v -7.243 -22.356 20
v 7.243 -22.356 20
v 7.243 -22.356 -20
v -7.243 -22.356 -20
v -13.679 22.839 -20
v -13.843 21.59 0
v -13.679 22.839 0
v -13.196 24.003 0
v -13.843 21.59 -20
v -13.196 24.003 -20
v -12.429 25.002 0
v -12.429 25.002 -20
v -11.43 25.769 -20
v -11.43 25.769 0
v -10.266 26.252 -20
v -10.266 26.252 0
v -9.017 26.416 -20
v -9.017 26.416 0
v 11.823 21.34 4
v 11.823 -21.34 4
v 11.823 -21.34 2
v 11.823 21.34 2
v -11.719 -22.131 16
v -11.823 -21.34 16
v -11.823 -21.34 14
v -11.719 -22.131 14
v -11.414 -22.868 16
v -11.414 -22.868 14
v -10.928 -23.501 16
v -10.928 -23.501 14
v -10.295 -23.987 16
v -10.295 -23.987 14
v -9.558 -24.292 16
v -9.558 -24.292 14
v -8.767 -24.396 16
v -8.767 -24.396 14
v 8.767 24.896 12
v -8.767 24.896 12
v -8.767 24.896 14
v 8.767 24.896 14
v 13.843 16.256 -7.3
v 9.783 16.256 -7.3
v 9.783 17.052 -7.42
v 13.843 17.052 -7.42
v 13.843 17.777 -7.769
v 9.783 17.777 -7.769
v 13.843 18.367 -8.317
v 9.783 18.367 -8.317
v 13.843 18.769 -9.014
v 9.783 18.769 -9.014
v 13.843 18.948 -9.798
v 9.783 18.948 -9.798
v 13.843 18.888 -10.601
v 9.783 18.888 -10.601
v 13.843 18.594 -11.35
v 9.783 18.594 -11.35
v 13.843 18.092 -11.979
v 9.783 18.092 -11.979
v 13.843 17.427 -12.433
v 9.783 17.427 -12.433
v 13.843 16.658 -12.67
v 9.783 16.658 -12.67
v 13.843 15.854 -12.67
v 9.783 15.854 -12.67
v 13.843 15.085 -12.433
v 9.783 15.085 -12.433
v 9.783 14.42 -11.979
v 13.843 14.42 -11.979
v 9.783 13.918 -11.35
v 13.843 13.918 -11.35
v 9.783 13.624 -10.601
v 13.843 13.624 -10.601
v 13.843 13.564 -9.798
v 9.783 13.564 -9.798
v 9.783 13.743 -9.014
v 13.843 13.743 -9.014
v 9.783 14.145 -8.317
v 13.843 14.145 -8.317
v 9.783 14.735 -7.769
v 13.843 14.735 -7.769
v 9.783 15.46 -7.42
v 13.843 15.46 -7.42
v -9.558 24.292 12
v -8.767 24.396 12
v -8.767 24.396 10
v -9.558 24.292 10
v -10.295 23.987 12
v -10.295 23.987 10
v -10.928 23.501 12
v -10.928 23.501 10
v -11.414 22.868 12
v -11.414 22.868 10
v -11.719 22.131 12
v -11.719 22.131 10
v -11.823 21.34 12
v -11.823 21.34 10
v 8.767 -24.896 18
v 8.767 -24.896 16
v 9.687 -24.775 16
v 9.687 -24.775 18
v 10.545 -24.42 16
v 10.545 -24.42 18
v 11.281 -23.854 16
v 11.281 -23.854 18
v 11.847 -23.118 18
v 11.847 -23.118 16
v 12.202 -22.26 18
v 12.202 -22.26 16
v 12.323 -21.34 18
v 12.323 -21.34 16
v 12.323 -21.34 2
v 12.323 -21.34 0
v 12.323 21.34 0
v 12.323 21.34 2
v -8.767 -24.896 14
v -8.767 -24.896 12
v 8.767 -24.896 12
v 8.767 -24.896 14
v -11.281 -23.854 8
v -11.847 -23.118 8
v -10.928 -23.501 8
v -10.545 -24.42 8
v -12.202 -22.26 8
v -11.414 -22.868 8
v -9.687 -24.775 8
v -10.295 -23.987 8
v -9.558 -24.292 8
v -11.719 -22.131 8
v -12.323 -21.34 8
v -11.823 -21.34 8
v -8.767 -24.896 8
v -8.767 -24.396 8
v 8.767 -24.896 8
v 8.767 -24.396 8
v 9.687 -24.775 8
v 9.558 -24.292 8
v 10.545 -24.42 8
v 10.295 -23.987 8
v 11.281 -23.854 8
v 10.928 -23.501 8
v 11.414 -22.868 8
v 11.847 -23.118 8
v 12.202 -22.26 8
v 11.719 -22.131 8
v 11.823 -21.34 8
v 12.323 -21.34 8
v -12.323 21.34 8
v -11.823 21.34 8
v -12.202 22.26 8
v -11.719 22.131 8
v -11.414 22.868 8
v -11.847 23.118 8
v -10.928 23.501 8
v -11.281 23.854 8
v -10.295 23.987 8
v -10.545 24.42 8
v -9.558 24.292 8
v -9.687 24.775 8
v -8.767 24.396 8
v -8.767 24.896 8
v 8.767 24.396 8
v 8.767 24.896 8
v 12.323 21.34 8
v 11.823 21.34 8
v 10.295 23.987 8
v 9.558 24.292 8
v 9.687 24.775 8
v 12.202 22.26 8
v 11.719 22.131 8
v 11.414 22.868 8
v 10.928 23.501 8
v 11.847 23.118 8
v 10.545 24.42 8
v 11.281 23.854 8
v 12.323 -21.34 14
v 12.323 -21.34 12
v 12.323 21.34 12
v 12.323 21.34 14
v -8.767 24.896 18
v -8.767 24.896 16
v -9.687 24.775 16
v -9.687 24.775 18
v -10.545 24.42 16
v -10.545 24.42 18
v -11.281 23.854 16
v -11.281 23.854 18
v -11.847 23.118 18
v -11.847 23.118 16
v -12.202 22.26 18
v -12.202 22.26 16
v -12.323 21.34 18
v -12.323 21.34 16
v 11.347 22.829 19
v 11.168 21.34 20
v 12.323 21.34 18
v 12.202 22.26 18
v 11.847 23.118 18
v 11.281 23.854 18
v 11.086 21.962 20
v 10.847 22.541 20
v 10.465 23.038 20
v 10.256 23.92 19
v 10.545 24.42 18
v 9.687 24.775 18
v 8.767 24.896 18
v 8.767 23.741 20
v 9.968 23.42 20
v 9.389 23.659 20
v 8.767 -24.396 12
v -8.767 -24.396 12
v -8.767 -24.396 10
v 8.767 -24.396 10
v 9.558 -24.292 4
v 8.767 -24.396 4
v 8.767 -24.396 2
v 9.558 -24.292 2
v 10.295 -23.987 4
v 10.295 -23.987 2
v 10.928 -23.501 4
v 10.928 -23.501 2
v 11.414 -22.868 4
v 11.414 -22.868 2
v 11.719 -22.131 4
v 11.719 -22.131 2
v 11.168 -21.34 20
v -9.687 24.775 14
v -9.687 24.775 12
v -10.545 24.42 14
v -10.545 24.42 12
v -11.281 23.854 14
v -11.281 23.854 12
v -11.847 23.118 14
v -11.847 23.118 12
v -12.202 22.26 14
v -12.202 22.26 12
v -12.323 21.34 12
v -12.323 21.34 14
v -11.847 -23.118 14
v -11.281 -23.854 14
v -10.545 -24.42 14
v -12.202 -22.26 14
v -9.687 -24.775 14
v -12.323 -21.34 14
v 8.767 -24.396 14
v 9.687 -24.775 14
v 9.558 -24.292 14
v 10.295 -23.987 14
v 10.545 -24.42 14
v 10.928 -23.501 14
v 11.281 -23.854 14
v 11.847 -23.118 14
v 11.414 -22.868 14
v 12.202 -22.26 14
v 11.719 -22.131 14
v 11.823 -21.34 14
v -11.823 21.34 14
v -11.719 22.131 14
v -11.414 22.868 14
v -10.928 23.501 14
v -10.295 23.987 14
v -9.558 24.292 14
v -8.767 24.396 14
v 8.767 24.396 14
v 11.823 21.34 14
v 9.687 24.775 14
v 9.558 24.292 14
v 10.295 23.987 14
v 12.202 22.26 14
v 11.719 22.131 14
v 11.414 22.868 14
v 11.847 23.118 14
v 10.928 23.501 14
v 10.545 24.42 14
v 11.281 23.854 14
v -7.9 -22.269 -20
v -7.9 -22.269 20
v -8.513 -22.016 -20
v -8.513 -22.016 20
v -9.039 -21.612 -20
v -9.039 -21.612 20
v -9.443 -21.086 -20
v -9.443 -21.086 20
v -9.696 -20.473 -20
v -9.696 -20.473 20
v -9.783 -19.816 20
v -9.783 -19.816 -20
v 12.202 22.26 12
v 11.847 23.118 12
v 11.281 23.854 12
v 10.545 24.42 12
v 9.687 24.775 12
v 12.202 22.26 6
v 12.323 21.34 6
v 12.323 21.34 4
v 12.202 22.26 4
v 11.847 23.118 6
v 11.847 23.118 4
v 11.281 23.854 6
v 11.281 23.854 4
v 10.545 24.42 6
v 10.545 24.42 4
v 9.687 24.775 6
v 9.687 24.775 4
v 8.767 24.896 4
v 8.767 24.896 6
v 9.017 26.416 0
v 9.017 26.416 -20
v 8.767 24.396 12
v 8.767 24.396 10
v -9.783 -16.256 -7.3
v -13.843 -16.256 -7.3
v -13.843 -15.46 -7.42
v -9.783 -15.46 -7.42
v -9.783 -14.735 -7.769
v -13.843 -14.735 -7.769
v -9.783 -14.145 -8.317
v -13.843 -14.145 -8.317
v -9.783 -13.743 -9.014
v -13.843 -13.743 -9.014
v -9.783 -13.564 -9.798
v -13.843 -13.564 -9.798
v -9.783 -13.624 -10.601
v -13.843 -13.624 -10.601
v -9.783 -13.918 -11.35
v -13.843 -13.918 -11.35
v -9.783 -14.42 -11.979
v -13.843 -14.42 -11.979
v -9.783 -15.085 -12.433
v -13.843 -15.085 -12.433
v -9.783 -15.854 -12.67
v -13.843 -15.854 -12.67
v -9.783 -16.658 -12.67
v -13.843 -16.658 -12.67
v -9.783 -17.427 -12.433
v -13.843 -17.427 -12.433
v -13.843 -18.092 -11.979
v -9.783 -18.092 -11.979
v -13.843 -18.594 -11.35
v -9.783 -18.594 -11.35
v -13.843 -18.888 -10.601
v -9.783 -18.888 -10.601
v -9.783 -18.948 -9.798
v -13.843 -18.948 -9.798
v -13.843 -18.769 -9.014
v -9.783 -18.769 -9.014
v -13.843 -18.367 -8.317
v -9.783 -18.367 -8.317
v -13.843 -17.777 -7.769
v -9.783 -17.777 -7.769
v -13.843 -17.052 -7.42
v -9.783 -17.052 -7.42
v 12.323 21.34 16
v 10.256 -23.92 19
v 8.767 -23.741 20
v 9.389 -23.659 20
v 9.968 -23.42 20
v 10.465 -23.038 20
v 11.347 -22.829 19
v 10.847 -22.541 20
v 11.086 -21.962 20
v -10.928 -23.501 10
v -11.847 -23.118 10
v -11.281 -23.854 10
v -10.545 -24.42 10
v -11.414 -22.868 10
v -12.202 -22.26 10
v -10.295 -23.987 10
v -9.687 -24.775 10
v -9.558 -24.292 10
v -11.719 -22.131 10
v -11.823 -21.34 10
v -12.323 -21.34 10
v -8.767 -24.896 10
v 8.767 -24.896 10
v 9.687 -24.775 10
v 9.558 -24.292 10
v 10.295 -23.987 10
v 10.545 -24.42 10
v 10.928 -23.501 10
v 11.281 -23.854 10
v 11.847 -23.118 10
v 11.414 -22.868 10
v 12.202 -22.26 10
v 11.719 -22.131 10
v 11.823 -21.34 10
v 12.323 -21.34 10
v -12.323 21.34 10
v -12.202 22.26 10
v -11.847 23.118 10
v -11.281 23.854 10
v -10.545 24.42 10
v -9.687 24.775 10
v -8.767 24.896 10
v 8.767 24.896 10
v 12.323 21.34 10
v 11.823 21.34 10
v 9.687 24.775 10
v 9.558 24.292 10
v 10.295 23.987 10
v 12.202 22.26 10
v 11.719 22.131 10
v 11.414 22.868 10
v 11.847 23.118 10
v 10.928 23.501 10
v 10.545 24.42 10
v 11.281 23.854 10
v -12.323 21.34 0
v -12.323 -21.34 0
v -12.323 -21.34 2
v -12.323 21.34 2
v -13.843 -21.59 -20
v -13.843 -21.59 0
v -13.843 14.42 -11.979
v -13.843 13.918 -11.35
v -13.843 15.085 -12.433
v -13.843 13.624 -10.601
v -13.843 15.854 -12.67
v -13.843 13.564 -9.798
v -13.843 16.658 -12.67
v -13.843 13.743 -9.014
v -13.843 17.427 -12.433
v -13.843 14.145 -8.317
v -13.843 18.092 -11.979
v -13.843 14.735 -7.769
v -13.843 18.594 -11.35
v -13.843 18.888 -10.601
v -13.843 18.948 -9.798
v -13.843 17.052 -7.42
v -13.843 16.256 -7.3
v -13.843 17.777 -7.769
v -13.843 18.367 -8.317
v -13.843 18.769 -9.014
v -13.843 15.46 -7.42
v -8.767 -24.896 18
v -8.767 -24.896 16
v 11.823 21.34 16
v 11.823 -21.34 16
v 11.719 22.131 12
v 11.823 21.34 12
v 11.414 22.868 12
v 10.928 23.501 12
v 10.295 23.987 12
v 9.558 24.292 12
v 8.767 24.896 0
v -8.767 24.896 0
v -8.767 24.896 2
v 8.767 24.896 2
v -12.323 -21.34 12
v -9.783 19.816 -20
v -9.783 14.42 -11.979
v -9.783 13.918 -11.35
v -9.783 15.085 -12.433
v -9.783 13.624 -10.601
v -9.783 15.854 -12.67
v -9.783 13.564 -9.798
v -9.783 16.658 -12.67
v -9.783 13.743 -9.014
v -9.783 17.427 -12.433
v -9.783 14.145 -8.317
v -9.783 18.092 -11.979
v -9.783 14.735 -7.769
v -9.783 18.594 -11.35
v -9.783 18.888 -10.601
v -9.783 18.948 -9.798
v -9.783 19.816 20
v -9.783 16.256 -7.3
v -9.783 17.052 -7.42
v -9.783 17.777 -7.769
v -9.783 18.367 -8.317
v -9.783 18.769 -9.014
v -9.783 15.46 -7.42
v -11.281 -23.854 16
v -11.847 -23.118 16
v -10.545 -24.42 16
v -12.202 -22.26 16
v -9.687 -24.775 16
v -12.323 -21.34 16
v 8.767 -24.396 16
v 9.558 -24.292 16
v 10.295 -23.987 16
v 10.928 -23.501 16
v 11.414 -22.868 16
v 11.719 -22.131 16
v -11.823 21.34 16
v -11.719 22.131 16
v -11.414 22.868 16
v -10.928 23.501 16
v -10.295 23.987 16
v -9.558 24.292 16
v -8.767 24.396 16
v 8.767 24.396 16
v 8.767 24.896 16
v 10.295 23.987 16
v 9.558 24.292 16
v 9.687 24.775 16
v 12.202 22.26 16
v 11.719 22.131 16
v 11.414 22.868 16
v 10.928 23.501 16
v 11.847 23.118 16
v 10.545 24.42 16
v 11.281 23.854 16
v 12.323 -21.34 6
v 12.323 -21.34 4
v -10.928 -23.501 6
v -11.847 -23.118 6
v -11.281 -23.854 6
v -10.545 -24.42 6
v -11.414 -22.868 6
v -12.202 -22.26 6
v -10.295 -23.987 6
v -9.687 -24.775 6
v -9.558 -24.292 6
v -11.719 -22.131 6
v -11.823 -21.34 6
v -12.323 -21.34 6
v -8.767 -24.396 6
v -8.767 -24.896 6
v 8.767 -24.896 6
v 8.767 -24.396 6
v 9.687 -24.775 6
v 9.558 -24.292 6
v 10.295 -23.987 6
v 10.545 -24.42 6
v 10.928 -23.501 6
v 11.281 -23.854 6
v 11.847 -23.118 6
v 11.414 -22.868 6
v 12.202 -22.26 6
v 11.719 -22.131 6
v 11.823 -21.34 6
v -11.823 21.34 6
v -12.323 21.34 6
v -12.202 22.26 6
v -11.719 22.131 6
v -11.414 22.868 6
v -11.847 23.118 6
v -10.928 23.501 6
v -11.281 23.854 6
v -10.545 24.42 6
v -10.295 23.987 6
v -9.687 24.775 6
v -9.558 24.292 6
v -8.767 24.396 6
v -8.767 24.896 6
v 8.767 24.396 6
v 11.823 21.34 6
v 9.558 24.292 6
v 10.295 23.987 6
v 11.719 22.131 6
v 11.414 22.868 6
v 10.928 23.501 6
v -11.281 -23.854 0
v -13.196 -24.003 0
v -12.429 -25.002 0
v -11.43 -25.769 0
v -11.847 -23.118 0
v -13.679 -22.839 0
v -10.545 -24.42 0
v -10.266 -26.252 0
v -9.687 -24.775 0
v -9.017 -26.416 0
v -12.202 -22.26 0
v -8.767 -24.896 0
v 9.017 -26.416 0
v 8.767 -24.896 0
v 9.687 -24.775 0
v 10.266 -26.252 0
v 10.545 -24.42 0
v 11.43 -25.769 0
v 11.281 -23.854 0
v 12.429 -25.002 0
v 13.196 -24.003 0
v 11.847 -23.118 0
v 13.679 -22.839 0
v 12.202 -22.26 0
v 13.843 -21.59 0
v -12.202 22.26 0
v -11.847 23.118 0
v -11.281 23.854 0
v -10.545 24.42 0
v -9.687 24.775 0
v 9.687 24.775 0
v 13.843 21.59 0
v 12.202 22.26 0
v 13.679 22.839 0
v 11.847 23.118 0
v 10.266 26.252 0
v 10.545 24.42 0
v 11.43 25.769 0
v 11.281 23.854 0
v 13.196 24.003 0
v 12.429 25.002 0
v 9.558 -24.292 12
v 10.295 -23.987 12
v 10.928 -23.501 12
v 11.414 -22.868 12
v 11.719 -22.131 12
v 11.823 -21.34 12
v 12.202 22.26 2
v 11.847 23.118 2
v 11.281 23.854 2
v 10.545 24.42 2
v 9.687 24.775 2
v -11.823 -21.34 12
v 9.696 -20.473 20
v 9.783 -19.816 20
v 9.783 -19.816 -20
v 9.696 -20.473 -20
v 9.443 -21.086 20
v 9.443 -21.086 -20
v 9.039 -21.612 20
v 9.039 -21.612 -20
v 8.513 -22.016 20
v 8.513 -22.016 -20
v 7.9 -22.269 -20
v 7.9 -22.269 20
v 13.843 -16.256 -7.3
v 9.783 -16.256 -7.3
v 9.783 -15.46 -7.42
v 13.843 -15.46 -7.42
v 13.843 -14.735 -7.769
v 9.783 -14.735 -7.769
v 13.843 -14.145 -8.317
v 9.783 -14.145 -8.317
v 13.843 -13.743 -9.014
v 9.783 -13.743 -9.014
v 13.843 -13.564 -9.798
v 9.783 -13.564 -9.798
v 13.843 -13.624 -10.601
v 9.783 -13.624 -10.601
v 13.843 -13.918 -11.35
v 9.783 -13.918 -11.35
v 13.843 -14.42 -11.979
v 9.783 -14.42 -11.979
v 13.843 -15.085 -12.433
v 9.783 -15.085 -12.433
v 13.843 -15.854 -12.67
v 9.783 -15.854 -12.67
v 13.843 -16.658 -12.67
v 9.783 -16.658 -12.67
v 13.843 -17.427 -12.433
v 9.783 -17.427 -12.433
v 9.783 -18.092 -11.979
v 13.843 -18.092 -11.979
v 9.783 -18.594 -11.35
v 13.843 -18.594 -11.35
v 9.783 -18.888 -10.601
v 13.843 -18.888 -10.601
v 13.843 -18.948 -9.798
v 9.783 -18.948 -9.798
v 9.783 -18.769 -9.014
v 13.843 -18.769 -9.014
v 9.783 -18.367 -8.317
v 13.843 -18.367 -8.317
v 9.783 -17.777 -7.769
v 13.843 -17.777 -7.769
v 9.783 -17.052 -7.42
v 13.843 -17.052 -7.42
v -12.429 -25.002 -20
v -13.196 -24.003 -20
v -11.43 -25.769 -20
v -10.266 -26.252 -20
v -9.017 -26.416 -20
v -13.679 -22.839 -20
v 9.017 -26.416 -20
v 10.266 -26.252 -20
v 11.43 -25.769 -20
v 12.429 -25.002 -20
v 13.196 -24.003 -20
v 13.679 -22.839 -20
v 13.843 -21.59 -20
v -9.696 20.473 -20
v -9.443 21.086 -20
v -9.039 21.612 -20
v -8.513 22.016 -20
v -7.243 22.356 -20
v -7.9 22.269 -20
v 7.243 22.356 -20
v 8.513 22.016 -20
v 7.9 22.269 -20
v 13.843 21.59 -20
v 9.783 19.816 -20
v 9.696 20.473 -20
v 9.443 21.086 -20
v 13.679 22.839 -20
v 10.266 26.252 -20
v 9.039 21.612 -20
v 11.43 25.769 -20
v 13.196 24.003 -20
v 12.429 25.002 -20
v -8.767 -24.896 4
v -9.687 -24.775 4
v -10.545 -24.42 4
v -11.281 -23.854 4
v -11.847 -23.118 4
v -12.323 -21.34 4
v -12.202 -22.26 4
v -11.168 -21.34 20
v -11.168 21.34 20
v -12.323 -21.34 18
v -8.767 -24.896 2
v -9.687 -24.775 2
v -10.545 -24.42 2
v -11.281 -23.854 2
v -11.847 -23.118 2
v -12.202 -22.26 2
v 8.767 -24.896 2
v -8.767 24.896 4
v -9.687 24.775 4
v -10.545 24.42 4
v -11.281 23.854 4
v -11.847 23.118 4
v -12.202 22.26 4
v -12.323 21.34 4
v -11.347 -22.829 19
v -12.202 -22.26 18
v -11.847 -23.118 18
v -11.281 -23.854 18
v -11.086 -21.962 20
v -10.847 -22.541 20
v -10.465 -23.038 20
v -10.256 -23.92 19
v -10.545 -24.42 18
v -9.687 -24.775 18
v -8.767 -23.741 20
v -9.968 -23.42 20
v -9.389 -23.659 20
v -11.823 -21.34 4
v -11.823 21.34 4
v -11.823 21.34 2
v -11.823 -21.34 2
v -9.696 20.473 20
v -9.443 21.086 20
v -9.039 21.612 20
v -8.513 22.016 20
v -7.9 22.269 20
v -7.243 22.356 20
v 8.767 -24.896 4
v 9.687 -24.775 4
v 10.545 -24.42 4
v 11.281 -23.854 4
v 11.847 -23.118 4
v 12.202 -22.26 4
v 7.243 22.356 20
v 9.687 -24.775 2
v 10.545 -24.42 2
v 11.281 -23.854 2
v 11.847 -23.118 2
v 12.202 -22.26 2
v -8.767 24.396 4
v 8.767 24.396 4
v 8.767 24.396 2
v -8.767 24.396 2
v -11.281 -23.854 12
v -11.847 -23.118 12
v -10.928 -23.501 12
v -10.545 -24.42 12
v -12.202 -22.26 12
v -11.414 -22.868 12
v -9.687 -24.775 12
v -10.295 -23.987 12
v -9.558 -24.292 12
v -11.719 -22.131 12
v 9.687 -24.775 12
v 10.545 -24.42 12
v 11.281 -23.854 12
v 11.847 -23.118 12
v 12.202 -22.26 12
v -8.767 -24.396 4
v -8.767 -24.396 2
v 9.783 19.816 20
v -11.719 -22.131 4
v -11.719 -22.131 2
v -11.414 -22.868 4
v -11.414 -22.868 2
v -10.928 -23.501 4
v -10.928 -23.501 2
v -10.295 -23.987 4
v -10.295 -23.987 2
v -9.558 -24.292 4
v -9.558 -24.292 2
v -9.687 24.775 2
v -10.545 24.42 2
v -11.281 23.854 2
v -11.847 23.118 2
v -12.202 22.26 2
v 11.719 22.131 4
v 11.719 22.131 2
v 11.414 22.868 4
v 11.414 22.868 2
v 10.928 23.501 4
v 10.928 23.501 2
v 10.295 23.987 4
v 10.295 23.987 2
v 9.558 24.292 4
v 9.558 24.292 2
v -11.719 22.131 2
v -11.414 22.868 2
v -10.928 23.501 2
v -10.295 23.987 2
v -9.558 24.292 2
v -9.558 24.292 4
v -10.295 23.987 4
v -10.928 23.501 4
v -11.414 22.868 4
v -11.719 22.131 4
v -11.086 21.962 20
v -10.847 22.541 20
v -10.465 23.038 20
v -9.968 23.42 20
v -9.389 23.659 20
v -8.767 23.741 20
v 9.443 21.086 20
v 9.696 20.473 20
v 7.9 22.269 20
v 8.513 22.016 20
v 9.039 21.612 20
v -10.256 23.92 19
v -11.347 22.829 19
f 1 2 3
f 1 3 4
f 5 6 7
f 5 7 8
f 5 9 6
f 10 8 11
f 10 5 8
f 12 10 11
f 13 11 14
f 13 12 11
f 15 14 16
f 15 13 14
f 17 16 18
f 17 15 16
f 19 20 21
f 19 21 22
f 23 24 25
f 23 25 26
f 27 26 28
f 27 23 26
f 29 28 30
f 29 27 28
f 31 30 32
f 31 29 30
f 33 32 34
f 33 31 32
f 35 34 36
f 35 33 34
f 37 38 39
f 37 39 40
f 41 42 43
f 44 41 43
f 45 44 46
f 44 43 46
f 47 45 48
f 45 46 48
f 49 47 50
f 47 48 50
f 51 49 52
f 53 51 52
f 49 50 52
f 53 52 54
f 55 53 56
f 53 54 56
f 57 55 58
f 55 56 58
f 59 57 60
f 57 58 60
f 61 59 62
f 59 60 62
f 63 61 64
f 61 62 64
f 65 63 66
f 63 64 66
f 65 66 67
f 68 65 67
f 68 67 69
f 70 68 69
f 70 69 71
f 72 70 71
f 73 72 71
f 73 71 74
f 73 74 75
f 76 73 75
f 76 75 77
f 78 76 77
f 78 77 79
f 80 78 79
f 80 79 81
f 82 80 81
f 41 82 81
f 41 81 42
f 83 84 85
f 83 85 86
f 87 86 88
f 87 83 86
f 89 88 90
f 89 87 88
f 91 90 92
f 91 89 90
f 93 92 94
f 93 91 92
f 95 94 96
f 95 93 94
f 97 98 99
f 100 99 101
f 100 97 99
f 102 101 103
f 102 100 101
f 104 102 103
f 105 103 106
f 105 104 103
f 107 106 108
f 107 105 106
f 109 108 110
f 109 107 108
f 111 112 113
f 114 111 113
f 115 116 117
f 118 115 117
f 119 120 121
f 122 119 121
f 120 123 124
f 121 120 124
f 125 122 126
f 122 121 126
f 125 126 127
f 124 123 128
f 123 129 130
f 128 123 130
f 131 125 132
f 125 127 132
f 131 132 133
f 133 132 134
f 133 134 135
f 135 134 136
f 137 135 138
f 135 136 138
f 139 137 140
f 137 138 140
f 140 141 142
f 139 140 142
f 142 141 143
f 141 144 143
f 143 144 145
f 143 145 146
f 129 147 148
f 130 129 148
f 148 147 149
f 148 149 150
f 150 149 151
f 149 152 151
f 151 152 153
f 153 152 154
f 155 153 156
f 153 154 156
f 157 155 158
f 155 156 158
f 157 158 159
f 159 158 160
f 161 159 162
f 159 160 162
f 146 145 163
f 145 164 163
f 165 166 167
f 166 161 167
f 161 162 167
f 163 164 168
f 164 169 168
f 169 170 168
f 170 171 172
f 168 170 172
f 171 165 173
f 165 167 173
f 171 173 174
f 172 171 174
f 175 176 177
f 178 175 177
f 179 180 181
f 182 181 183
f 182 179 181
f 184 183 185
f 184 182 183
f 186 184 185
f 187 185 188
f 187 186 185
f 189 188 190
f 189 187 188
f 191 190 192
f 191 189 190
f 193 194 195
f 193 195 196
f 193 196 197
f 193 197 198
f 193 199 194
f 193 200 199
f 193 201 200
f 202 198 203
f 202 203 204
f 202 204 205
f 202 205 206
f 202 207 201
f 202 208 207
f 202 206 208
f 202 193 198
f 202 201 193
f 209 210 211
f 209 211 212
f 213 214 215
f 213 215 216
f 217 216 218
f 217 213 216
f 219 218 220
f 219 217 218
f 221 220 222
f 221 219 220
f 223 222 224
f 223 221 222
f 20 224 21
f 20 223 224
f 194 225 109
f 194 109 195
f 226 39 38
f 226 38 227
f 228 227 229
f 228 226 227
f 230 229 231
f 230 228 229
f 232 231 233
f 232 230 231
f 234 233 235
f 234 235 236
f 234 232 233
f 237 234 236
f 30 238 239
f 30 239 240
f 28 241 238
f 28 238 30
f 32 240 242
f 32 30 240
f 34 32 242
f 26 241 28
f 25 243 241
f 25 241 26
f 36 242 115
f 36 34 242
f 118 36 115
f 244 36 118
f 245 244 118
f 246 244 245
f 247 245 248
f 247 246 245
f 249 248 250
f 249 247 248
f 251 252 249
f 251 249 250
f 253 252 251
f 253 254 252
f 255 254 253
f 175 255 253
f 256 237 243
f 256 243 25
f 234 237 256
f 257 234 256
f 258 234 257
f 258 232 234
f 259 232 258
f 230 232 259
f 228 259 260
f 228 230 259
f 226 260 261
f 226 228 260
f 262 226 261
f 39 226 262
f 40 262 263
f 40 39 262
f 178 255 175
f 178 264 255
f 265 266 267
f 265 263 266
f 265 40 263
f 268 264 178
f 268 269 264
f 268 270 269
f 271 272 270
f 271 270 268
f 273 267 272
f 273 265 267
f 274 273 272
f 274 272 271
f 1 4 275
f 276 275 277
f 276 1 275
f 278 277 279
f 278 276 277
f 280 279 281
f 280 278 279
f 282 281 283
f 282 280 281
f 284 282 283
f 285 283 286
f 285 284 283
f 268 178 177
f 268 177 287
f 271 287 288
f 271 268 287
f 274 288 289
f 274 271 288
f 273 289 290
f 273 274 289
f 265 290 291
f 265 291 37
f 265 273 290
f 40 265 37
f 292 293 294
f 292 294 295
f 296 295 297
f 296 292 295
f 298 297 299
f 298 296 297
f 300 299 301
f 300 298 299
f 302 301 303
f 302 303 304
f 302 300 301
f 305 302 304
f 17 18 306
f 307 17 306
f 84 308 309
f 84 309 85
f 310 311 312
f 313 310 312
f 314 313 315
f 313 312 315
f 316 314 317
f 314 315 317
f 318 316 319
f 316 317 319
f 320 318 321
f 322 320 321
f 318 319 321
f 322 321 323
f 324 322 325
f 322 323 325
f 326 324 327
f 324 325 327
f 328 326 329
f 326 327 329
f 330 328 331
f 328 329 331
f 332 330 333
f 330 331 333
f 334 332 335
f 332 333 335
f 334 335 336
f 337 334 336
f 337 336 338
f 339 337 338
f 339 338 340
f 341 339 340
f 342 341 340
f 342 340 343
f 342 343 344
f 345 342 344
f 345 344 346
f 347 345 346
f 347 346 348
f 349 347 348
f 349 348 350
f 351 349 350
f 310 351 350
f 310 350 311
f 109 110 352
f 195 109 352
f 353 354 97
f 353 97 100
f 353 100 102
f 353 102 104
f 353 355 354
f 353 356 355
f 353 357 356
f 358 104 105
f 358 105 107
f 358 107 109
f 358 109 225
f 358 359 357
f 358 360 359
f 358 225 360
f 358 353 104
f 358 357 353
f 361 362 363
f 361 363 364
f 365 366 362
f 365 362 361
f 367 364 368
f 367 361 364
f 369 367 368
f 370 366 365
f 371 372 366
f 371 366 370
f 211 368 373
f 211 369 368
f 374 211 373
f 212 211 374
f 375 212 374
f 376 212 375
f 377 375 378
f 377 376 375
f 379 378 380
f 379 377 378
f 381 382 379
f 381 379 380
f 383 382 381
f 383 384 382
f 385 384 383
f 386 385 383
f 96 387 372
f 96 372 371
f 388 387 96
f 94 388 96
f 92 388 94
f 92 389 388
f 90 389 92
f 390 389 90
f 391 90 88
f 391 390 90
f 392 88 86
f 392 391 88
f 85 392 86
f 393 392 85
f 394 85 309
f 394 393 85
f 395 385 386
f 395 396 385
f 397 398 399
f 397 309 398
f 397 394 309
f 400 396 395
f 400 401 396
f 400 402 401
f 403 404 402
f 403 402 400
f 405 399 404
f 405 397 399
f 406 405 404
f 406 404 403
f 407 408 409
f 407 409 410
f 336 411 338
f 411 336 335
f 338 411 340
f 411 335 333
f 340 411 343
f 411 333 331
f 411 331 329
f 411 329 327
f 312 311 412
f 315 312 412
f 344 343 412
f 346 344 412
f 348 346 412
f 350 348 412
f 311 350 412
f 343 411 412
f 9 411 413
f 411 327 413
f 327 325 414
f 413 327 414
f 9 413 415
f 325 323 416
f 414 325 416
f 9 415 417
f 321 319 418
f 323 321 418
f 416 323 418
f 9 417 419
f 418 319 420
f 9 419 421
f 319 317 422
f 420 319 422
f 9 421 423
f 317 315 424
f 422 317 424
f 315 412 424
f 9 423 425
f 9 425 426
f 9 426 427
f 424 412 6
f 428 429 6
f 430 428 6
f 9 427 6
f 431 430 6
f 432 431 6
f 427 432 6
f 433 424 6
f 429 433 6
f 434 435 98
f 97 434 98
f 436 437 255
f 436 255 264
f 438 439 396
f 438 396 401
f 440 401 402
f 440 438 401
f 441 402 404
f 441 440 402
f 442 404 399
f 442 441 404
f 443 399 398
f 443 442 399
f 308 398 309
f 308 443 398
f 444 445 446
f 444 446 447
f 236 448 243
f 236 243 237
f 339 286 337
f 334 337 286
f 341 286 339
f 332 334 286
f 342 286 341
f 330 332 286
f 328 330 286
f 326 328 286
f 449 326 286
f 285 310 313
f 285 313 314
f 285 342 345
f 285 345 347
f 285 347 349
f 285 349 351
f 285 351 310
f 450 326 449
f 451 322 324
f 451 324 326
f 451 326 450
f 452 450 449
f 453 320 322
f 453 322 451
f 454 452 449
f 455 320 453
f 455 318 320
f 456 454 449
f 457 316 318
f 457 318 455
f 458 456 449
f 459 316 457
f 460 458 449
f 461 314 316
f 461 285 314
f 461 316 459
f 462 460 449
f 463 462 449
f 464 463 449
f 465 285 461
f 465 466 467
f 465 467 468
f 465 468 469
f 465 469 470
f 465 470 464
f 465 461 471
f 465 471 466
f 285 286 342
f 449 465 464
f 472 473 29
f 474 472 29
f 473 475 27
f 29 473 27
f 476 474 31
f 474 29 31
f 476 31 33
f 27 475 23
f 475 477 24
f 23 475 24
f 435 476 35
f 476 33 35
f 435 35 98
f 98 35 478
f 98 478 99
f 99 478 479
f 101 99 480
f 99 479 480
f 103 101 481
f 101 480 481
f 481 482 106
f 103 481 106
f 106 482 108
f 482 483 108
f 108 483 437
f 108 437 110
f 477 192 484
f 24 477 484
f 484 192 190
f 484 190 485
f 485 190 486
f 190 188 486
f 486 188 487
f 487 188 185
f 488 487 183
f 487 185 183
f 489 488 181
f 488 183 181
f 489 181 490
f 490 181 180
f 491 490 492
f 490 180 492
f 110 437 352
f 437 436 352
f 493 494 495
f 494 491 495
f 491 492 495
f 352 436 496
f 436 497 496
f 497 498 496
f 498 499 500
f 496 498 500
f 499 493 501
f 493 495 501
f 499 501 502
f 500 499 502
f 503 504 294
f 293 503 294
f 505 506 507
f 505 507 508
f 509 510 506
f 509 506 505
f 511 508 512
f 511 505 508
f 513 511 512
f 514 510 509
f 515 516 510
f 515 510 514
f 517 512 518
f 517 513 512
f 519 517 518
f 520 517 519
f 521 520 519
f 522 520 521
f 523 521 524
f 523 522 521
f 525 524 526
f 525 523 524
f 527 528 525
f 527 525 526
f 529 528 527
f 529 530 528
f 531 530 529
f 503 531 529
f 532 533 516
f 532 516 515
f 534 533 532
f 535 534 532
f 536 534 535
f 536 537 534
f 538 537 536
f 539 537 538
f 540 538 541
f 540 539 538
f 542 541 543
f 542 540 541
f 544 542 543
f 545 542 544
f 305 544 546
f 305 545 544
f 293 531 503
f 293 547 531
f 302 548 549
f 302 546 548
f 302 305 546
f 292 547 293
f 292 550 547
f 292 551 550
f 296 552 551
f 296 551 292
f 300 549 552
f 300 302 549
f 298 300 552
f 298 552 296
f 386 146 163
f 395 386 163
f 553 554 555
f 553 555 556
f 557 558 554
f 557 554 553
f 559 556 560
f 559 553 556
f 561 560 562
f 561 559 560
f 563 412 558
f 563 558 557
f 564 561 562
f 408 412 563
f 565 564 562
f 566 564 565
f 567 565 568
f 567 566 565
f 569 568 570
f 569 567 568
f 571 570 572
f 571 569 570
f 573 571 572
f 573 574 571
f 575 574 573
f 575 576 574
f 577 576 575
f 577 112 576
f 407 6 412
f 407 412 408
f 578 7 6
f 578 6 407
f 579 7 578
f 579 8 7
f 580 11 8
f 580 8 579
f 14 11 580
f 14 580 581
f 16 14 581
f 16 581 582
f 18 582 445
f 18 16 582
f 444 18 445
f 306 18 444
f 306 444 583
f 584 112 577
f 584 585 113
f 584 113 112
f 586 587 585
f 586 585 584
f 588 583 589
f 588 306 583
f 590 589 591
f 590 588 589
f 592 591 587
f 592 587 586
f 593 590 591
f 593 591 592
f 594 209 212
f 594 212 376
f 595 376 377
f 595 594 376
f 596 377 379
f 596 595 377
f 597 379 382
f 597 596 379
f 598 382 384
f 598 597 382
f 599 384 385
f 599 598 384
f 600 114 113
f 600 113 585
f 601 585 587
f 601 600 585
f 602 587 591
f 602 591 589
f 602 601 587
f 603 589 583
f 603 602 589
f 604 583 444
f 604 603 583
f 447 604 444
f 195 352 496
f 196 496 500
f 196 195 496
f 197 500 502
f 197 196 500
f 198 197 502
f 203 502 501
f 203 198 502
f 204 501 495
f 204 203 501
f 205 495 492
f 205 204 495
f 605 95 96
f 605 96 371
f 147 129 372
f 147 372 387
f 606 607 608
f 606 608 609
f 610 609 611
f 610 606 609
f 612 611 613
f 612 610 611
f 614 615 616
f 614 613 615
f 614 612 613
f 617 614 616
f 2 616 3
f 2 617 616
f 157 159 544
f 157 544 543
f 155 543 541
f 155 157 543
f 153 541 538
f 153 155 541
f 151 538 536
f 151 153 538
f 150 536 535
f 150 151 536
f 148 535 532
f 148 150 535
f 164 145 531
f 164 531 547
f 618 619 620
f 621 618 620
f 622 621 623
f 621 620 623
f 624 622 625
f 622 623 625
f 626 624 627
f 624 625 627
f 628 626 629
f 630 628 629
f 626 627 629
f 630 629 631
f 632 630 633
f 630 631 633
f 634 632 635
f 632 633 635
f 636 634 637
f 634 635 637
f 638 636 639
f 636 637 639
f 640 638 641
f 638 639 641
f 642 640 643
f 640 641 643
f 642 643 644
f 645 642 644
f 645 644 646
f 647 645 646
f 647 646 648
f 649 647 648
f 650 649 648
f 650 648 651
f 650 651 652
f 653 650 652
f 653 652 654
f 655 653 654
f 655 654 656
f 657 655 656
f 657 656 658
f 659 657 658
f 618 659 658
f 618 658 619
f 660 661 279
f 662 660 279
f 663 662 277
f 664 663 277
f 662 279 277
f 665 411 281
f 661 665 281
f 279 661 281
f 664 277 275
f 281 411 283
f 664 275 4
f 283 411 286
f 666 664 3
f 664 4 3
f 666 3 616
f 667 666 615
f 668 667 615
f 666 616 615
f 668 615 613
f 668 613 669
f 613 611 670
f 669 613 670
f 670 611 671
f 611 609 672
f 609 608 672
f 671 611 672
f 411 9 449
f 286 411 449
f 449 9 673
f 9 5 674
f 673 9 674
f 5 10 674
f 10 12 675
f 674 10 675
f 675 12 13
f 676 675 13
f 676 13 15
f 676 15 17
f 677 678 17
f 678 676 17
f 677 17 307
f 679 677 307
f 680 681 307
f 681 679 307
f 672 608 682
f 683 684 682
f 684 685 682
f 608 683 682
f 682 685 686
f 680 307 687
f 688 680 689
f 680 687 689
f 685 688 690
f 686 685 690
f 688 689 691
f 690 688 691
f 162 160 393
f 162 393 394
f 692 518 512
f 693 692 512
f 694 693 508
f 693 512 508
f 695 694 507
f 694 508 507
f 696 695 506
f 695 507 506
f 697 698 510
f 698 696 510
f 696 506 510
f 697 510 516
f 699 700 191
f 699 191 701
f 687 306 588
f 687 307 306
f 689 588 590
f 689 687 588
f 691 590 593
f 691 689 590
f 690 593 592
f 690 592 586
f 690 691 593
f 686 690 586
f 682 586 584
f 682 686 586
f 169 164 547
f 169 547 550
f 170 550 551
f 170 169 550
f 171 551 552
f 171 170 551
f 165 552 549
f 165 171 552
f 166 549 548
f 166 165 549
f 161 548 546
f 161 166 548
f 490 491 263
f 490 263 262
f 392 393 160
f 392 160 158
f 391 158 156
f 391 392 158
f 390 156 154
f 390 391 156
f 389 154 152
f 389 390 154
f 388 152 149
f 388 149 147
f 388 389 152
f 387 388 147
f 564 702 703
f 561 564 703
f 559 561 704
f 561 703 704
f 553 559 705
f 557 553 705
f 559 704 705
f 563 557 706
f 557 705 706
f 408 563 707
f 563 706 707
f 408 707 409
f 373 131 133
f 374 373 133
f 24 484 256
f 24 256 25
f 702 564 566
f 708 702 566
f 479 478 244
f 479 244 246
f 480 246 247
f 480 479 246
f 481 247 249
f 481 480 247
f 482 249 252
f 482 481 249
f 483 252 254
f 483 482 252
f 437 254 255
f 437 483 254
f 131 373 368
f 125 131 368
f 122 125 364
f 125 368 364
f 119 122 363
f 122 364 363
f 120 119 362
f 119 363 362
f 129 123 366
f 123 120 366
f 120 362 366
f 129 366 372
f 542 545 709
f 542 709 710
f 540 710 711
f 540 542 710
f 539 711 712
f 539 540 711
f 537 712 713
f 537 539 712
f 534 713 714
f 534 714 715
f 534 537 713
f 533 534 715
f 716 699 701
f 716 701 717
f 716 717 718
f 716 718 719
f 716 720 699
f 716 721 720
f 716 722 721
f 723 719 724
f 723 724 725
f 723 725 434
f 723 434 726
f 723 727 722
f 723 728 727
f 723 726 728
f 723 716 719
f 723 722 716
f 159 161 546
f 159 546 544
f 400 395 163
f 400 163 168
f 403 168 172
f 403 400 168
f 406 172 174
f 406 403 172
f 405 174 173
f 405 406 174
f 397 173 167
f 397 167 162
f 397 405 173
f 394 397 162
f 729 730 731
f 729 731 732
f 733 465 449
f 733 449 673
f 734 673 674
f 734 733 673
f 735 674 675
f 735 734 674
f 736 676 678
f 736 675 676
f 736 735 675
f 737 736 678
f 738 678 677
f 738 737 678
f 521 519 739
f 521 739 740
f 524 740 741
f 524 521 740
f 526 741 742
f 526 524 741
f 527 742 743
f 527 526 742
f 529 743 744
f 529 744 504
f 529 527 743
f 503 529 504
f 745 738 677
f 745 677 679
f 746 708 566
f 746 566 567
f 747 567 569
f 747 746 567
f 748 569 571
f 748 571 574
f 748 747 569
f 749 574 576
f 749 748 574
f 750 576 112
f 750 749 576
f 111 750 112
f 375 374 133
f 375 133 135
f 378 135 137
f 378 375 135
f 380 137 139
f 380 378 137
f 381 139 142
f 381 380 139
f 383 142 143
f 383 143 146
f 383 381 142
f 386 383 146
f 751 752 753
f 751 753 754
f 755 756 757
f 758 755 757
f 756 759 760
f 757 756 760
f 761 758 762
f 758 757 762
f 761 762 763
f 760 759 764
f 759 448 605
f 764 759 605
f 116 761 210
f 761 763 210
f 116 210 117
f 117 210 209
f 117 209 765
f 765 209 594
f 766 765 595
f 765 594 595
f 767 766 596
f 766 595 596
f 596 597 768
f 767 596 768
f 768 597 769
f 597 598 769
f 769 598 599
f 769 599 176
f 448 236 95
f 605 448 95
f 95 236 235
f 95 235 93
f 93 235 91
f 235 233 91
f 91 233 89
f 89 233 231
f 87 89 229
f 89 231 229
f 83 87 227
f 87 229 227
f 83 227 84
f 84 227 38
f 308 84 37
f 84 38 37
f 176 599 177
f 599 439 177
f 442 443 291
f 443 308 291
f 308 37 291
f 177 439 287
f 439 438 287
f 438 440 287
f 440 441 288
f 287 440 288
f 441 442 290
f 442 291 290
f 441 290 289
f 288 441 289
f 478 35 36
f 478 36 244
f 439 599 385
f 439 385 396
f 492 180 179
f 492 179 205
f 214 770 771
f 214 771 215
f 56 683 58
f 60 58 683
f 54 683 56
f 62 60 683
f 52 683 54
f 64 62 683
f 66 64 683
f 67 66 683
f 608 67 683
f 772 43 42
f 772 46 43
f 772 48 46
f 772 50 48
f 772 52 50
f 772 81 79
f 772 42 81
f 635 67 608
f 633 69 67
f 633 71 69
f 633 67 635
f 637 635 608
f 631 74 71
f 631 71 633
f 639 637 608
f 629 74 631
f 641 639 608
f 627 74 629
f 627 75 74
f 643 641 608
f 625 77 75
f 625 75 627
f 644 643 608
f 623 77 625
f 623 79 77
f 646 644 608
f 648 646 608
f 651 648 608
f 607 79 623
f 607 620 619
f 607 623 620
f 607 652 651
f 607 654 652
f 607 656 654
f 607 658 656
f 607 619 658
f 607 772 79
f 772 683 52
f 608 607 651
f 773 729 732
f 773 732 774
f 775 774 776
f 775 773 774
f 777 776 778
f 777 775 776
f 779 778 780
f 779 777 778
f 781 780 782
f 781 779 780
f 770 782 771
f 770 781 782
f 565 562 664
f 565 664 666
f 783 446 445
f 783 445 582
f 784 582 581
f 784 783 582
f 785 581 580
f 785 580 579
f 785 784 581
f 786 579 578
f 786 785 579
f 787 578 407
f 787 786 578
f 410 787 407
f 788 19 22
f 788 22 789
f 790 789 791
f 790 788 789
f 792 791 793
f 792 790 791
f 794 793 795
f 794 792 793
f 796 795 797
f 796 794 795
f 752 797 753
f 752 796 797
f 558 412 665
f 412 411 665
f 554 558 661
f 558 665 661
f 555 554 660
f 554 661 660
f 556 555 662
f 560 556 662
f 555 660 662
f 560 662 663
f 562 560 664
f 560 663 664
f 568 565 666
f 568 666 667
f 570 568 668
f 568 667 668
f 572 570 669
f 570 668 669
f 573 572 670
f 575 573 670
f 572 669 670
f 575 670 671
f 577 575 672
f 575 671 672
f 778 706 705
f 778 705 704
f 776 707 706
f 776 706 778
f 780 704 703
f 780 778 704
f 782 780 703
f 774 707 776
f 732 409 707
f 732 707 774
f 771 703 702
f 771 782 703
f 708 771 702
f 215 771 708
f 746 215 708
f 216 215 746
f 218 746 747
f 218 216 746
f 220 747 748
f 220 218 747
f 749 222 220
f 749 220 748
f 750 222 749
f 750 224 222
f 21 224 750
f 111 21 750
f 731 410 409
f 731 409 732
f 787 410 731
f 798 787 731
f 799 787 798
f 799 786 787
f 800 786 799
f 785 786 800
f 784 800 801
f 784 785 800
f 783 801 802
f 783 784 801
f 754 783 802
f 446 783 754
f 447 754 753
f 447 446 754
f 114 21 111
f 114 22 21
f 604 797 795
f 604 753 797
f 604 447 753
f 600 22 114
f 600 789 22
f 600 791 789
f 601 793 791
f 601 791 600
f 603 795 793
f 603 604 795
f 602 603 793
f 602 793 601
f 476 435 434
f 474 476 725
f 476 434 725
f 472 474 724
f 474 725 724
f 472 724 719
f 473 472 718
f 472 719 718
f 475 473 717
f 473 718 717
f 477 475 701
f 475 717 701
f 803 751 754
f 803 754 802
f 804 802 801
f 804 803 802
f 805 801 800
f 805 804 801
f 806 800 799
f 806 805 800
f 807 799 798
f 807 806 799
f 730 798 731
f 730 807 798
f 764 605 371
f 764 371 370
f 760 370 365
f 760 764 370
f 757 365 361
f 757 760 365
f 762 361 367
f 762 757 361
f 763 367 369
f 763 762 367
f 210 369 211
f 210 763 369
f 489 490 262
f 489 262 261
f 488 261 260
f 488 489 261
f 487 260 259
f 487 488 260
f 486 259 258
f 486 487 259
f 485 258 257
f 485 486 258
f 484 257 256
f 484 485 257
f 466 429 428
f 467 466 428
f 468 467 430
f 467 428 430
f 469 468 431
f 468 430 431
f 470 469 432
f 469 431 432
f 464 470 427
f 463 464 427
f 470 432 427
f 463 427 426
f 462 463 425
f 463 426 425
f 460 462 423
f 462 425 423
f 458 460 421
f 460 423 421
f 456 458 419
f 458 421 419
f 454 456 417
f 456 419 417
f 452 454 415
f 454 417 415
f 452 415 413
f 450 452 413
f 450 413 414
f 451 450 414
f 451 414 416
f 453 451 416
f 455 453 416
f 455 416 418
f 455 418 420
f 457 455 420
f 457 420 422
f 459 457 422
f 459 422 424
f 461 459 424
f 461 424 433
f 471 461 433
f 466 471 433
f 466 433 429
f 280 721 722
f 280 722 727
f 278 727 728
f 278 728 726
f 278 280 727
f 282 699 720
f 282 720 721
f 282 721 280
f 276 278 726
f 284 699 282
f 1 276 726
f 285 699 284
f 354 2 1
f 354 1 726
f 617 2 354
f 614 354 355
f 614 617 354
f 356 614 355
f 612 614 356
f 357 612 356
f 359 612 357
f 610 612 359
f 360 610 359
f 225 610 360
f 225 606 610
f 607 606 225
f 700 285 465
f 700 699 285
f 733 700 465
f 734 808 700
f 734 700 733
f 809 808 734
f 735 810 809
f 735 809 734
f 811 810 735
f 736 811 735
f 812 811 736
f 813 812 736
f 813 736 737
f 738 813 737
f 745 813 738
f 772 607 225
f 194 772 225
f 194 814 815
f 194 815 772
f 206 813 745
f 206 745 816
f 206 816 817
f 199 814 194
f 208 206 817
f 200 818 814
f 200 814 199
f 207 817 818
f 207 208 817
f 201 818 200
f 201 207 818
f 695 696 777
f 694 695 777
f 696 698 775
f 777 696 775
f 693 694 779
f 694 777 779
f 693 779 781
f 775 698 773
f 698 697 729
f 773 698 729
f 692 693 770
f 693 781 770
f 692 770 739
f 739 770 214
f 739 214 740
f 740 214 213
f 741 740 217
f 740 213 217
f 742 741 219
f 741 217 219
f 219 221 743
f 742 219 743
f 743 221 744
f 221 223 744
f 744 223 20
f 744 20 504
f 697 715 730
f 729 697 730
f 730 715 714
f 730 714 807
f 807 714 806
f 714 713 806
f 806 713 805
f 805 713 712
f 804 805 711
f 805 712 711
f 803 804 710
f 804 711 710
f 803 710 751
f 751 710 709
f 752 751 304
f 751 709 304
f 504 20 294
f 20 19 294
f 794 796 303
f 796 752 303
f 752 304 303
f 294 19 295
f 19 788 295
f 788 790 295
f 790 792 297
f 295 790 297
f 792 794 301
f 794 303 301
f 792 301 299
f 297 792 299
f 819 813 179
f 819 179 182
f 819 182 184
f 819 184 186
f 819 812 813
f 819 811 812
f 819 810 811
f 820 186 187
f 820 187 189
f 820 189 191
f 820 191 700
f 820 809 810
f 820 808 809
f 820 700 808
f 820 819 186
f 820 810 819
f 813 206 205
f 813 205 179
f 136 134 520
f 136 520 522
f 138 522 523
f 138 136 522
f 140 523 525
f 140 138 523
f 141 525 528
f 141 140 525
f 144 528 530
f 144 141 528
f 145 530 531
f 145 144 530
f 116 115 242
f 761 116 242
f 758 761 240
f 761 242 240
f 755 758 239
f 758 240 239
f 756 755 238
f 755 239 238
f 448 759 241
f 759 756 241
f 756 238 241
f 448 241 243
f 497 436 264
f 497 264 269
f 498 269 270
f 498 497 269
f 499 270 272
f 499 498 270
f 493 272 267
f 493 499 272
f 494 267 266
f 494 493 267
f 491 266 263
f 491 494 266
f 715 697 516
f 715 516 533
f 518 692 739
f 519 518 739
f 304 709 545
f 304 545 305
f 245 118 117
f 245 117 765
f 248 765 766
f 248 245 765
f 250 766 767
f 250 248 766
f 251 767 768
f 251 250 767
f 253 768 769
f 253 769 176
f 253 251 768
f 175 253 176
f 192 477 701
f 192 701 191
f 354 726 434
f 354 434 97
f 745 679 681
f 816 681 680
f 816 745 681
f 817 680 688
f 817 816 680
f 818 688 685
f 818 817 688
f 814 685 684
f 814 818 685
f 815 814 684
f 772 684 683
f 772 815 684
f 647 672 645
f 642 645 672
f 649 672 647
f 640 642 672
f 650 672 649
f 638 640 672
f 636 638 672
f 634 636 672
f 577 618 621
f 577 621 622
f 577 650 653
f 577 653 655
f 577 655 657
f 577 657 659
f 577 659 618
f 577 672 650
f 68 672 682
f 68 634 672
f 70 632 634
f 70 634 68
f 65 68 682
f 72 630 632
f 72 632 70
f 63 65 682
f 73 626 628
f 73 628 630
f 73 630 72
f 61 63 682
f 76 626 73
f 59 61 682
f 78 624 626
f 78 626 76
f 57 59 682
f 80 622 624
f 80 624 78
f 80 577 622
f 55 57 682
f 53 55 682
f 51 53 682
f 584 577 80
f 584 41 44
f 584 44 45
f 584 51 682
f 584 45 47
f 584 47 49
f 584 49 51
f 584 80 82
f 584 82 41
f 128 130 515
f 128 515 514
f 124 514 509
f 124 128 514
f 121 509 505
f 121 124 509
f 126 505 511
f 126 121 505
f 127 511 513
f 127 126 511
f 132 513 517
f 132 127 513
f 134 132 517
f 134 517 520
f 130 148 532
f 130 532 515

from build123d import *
from OCP.BRepFilletAPI import BRepFilletAPI_MakeChamfer

# Parameters (mm, degrees)
SKETCH1_W             = 24.646
SKETCH1_H             = 49.792
BOSS_EXTRUDE1_DEPTH   = 20
SKETCH2_W             = 27.686
SKETCH2_H             = 52.832
BOSS_EXTRUDE2_DEPTH   = 20
FILLET1_R             = 3.556
FILLET2_R             = 4.826
F_5_0MM_DOWEL_HOLE2_D = 5.4
CUT_EXTRUDE1_DEPTH    = 50.894225167
CUT_EXTRUDE2_START    = -4
CUT_EXTRUDE2_DEPTH    = 2
LPATTERN1_COUNT       = 4
LPATTERN1_PITCH       = 4
CHAMFER1_SIZE         = 2
CHAMFER1_SIZE2        = 1.154700538


with BuildPart() as part:
    # Sketch1 → Boss-Extrude1 (new body)
    with BuildSketch(Plane.XY):
        Rectangle(SKETCH1_W, SKETCH1_H)
    extrude(amount=BOSS_EXTRUDE1_DEPTH)

    # Sketch2 → Boss-Extrude2 (add)
    with BuildSketch(Plane.XY):
        Rectangle(SKETCH2_W, SKETCH2_H)
    extrude(amount=-BOSS_EXTRUDE2_DEPTH)

    # Fillet1
    fillet1_edges = [part.edges().sort_by_distance(p)[0] for p in [
        (-12.323, 24.896, 10),
        (12.323, 24.896, 10),
        (12.323, -24.896, 10),
        (-12.323, -24.896, 10),
    ]]
    fillet(fillet1_edges, radius=FILLET1_R)

    # Fillet2
    fillet2_edges = [part.edges().sort_by_distance(p)[0] for p in [
        (-13.843, -26.416, -10),
        (-13.843, 26.416, -10),
        (13.843, 26.416, -10),
        (13.843, -26.416, -10),
    ]]
    fillet(fillet2_edges, radius=FILLET2_R)

    # Ø5.0mm Dowel Hole2 (through all)
    with Locations(Plane(origin=(13.843, 0, 0), x_dir=(0, 0, -1), z_dir=(1, 0, 0))):
        with Locations((10, 16.256), (10, -16.256)):
            Hole(F_5_0MM_DOWEL_HOLE2_D / 2)

    # Sketch9 → Cut-Extrude1 (cut, through all)
    with BuildSketch(Plane.XY.offset(20)):
        with BuildLine():
            Line((7.243, -22.356), (-7.243, -22.356))
            ThreePointArc((-7.243, -22.356), (-9.039051224, -21.612051224), (-9.783, -19.816))
            Line((-9.783, -19.816), (-9.783, 19.816))
            ThreePointArc((-9.783, 19.816), (-9.039051224, 21.612051224), (-7.243, 22.356))
            Line((-7.243, 22.356), (7.243, 22.356))
            ThreePointArc((7.243, 22.356), (9.039051224, 21.612051224), (9.783, 19.816))
            Line((9.783, 19.816), (9.783, -19.816))
            ThreePointArc((9.783, -19.816), (9.039051224, -21.612051224), (7.243, -22.356))
        make_face()
    extrude(amount=-CUT_EXTRUDE1_DEPTH, mode=Mode.SUBTRACT)

    # Sketch10 → Cut-Extrude2 (cut)
    with BuildSketch(Plane.XY.offset(20).offset(CUT_EXTRUDE2_START)):
        with BuildLine():
            Line((-12.323, 21.34), (-12.323, -21.34))
            ThreePointArc((-12.323, -21.34), (-11.281471714, -23.854471714), (-8.767, -24.896))
            Line((-8.767, -24.896), (8.767, -24.896))
            ThreePointArc((8.767, -24.896), (11.281471714, -23.854471714), (12.323, -21.34))
            Line((12.323, -21.34), (12.323, 21.34))
            ThreePointArc((12.323, 21.34), (11.281471714, 23.854471714), (8.767, 24.896))
            Line((8.767, 24.896), (-8.767, 24.896))
            ThreePointArc((-8.767, 24.896), (-11.281471714, 23.854471714), (-12.323, 21.34))
        make_face()
        with BuildLine():
            Line((-11.823, 21.34), (-11.823, -21.34))
            ThreePointArc((-11.823, -21.34), (-10.927918323, -23.500918323), (-8.767, -24.396))
            Line((-8.767, -24.396), (8.767, -24.396))
            ThreePointArc((8.767, -24.396), (10.927918323, -23.500918323), (11.823, -21.34))
            Line((11.823, -21.34), (11.823, 21.34))
            ThreePointArc((11.823, 21.34), (10.927918323, 23.500918323), (8.767, 24.396))
            Line((8.767, 24.396), (-8.767, 24.396))
            ThreePointArc((-8.767, 24.396), (-10.927918323, 23.500918323), (-11.823, 21.34))
        make_face(mode=Mode.SUBTRACT)
    cut_extrude2 = extrude(amount=-CUT_EXTRUDE2_DEPTH, mode=Mode.SUBTRACT)

    # LPattern1: Cut-Extrude2 ×4
    with Locations(*[(0, 0, -i * LPATTERN1_PITCH) for i in range(1, LPATTERN1_COUNT)]):
        add(cut_extrude2, mode=Mode.SUBTRACT)

    # Chamfer1: one chamfer whose edges measure the first distance from different faces: ONE call of the kernel's chamfer builder (chamfer() names one face for all edges)
    chamfer1_edges_1 = [part.edges().sort_by_distance(p)[0] for p in [
        (0, -24.896, 20),
    ]]
    chamfer1_side_1 = [part.faces().sort_by_distance(p)[0] for p in [
        (0, -24.896, 18),
    ]]
    chamfer1_edges_2 = [part.edges().sort_by_distance(p)[0] for p in [
        (-12.323, 0, 20),
    ]]
    chamfer1_side_2 = [part.faces().sort_by_distance(p)[0] for p in [
        (-12.323, 0, 18),
    ]]
    chamfer1_edges_3 = [part.edges().sort_by_distance(p)[0] for p in [
        (12.323, 0, 20),
    ]]
    chamfer1_side_3 = [part.faces().sort_by_distance(p)[0] for p in [
        (12.323, 0, 18),
    ]]
    chamfer1_edges_4 = [part.edges().sort_by_distance(p)[0] for p in [
        (0, 24.896, 20),
    ]]
    chamfer1_side_4 = [part.faces().sort_by_distance(p)[0] for p in [
        (0, 24.896, 18),
    ]]
    chamfer1_edges_5 = [part.edges().sort_by_distance(p)[0] for p in [
        (-11.281471714, 23.854471714, 20),
    ]]
    chamfer1_side_5 = [part.faces().sort_by_distance(p)[0] for p in [
        (-11.281471714, 23.854471714, 18),
    ]]
    chamfer1_edges_6 = [part.edges().sort_by_distance(p)[0] for p in [
        (11.281471714, 23.854471714, 20),
    ]]
    chamfer1_side_6 = [part.faces().sort_by_distance(p)[0] for p in [
        (11.281471714, 23.854471714, 18),
    ]]
    chamfer1_edges_7 = [part.edges().sort_by_distance(p)[0] for p in [
        (11.281471714, -23.854471714, 20),
    ]]
    chamfer1_side_7 = [part.faces().sort_by_distance(p)[0] for p in [
        (11.281471714, -23.854471714, 18),
    ]]
    chamfer1_edges_8 = [part.edges().sort_by_distance(p)[0] for p in [
        (-11.281471714, -23.854471714, 20),
    ]]
    chamfer1_side_8 = [part.faces().sort_by_distance(p)[0] for p in [
        (-11.281471714, -23.854471714, 18),
    ]]
    chamfer1 = BRepFilletAPI_MakeChamfer(part.part.solid().wrapped)
    for e in chamfer1_edges_1:
        chamfer1.Add(CHAMFER1_SIZE, CHAMFER1_SIZE2, e.wrapped, chamfer1_side_1[0].wrapped)  # the first distance lies on this face
    for e in chamfer1_edges_2:
        chamfer1.Add(CHAMFER1_SIZE, CHAMFER1_SIZE2, e.wrapped, chamfer1_side_2[0].wrapped)  # the first distance lies on this face
    for e in chamfer1_edges_3:
        chamfer1.Add(CHAMFER1_SIZE, CHAMFER1_SIZE2, e.wrapped, chamfer1_side_3[0].wrapped)  # the first distance lies on this face
    for e in chamfer1_edges_4:
        chamfer1.Add(CHAMFER1_SIZE, CHAMFER1_SIZE2, e.wrapped, chamfer1_side_4[0].wrapped)  # the first distance lies on this face
    for e in chamfer1_edges_5:
        chamfer1.Add(CHAMFER1_SIZE, CHAMFER1_SIZE2, e.wrapped, chamfer1_side_5[0].wrapped)  # the first distance lies on this face
    for e in chamfer1_edges_6:
        chamfer1.Add(CHAMFER1_SIZE, CHAMFER1_SIZE2, e.wrapped, chamfer1_side_6[0].wrapped)  # the first distance lies on this face
    for e in chamfer1_edges_7:
        chamfer1.Add(CHAMFER1_SIZE, CHAMFER1_SIZE2, e.wrapped, chamfer1_side_7[0].wrapped)  # the first distance lies on this face
    for e in chamfer1_edges_8:
        chamfer1.Add(CHAMFER1_SIZE, CHAMFER1_SIZE2, e.wrapped, chamfer1_side_8[0].wrapped)  # the first distance lies on this face
    add(Compound.cast(chamfer1.Shape()), mode=Mode.REPLACE)


solid = part.part
